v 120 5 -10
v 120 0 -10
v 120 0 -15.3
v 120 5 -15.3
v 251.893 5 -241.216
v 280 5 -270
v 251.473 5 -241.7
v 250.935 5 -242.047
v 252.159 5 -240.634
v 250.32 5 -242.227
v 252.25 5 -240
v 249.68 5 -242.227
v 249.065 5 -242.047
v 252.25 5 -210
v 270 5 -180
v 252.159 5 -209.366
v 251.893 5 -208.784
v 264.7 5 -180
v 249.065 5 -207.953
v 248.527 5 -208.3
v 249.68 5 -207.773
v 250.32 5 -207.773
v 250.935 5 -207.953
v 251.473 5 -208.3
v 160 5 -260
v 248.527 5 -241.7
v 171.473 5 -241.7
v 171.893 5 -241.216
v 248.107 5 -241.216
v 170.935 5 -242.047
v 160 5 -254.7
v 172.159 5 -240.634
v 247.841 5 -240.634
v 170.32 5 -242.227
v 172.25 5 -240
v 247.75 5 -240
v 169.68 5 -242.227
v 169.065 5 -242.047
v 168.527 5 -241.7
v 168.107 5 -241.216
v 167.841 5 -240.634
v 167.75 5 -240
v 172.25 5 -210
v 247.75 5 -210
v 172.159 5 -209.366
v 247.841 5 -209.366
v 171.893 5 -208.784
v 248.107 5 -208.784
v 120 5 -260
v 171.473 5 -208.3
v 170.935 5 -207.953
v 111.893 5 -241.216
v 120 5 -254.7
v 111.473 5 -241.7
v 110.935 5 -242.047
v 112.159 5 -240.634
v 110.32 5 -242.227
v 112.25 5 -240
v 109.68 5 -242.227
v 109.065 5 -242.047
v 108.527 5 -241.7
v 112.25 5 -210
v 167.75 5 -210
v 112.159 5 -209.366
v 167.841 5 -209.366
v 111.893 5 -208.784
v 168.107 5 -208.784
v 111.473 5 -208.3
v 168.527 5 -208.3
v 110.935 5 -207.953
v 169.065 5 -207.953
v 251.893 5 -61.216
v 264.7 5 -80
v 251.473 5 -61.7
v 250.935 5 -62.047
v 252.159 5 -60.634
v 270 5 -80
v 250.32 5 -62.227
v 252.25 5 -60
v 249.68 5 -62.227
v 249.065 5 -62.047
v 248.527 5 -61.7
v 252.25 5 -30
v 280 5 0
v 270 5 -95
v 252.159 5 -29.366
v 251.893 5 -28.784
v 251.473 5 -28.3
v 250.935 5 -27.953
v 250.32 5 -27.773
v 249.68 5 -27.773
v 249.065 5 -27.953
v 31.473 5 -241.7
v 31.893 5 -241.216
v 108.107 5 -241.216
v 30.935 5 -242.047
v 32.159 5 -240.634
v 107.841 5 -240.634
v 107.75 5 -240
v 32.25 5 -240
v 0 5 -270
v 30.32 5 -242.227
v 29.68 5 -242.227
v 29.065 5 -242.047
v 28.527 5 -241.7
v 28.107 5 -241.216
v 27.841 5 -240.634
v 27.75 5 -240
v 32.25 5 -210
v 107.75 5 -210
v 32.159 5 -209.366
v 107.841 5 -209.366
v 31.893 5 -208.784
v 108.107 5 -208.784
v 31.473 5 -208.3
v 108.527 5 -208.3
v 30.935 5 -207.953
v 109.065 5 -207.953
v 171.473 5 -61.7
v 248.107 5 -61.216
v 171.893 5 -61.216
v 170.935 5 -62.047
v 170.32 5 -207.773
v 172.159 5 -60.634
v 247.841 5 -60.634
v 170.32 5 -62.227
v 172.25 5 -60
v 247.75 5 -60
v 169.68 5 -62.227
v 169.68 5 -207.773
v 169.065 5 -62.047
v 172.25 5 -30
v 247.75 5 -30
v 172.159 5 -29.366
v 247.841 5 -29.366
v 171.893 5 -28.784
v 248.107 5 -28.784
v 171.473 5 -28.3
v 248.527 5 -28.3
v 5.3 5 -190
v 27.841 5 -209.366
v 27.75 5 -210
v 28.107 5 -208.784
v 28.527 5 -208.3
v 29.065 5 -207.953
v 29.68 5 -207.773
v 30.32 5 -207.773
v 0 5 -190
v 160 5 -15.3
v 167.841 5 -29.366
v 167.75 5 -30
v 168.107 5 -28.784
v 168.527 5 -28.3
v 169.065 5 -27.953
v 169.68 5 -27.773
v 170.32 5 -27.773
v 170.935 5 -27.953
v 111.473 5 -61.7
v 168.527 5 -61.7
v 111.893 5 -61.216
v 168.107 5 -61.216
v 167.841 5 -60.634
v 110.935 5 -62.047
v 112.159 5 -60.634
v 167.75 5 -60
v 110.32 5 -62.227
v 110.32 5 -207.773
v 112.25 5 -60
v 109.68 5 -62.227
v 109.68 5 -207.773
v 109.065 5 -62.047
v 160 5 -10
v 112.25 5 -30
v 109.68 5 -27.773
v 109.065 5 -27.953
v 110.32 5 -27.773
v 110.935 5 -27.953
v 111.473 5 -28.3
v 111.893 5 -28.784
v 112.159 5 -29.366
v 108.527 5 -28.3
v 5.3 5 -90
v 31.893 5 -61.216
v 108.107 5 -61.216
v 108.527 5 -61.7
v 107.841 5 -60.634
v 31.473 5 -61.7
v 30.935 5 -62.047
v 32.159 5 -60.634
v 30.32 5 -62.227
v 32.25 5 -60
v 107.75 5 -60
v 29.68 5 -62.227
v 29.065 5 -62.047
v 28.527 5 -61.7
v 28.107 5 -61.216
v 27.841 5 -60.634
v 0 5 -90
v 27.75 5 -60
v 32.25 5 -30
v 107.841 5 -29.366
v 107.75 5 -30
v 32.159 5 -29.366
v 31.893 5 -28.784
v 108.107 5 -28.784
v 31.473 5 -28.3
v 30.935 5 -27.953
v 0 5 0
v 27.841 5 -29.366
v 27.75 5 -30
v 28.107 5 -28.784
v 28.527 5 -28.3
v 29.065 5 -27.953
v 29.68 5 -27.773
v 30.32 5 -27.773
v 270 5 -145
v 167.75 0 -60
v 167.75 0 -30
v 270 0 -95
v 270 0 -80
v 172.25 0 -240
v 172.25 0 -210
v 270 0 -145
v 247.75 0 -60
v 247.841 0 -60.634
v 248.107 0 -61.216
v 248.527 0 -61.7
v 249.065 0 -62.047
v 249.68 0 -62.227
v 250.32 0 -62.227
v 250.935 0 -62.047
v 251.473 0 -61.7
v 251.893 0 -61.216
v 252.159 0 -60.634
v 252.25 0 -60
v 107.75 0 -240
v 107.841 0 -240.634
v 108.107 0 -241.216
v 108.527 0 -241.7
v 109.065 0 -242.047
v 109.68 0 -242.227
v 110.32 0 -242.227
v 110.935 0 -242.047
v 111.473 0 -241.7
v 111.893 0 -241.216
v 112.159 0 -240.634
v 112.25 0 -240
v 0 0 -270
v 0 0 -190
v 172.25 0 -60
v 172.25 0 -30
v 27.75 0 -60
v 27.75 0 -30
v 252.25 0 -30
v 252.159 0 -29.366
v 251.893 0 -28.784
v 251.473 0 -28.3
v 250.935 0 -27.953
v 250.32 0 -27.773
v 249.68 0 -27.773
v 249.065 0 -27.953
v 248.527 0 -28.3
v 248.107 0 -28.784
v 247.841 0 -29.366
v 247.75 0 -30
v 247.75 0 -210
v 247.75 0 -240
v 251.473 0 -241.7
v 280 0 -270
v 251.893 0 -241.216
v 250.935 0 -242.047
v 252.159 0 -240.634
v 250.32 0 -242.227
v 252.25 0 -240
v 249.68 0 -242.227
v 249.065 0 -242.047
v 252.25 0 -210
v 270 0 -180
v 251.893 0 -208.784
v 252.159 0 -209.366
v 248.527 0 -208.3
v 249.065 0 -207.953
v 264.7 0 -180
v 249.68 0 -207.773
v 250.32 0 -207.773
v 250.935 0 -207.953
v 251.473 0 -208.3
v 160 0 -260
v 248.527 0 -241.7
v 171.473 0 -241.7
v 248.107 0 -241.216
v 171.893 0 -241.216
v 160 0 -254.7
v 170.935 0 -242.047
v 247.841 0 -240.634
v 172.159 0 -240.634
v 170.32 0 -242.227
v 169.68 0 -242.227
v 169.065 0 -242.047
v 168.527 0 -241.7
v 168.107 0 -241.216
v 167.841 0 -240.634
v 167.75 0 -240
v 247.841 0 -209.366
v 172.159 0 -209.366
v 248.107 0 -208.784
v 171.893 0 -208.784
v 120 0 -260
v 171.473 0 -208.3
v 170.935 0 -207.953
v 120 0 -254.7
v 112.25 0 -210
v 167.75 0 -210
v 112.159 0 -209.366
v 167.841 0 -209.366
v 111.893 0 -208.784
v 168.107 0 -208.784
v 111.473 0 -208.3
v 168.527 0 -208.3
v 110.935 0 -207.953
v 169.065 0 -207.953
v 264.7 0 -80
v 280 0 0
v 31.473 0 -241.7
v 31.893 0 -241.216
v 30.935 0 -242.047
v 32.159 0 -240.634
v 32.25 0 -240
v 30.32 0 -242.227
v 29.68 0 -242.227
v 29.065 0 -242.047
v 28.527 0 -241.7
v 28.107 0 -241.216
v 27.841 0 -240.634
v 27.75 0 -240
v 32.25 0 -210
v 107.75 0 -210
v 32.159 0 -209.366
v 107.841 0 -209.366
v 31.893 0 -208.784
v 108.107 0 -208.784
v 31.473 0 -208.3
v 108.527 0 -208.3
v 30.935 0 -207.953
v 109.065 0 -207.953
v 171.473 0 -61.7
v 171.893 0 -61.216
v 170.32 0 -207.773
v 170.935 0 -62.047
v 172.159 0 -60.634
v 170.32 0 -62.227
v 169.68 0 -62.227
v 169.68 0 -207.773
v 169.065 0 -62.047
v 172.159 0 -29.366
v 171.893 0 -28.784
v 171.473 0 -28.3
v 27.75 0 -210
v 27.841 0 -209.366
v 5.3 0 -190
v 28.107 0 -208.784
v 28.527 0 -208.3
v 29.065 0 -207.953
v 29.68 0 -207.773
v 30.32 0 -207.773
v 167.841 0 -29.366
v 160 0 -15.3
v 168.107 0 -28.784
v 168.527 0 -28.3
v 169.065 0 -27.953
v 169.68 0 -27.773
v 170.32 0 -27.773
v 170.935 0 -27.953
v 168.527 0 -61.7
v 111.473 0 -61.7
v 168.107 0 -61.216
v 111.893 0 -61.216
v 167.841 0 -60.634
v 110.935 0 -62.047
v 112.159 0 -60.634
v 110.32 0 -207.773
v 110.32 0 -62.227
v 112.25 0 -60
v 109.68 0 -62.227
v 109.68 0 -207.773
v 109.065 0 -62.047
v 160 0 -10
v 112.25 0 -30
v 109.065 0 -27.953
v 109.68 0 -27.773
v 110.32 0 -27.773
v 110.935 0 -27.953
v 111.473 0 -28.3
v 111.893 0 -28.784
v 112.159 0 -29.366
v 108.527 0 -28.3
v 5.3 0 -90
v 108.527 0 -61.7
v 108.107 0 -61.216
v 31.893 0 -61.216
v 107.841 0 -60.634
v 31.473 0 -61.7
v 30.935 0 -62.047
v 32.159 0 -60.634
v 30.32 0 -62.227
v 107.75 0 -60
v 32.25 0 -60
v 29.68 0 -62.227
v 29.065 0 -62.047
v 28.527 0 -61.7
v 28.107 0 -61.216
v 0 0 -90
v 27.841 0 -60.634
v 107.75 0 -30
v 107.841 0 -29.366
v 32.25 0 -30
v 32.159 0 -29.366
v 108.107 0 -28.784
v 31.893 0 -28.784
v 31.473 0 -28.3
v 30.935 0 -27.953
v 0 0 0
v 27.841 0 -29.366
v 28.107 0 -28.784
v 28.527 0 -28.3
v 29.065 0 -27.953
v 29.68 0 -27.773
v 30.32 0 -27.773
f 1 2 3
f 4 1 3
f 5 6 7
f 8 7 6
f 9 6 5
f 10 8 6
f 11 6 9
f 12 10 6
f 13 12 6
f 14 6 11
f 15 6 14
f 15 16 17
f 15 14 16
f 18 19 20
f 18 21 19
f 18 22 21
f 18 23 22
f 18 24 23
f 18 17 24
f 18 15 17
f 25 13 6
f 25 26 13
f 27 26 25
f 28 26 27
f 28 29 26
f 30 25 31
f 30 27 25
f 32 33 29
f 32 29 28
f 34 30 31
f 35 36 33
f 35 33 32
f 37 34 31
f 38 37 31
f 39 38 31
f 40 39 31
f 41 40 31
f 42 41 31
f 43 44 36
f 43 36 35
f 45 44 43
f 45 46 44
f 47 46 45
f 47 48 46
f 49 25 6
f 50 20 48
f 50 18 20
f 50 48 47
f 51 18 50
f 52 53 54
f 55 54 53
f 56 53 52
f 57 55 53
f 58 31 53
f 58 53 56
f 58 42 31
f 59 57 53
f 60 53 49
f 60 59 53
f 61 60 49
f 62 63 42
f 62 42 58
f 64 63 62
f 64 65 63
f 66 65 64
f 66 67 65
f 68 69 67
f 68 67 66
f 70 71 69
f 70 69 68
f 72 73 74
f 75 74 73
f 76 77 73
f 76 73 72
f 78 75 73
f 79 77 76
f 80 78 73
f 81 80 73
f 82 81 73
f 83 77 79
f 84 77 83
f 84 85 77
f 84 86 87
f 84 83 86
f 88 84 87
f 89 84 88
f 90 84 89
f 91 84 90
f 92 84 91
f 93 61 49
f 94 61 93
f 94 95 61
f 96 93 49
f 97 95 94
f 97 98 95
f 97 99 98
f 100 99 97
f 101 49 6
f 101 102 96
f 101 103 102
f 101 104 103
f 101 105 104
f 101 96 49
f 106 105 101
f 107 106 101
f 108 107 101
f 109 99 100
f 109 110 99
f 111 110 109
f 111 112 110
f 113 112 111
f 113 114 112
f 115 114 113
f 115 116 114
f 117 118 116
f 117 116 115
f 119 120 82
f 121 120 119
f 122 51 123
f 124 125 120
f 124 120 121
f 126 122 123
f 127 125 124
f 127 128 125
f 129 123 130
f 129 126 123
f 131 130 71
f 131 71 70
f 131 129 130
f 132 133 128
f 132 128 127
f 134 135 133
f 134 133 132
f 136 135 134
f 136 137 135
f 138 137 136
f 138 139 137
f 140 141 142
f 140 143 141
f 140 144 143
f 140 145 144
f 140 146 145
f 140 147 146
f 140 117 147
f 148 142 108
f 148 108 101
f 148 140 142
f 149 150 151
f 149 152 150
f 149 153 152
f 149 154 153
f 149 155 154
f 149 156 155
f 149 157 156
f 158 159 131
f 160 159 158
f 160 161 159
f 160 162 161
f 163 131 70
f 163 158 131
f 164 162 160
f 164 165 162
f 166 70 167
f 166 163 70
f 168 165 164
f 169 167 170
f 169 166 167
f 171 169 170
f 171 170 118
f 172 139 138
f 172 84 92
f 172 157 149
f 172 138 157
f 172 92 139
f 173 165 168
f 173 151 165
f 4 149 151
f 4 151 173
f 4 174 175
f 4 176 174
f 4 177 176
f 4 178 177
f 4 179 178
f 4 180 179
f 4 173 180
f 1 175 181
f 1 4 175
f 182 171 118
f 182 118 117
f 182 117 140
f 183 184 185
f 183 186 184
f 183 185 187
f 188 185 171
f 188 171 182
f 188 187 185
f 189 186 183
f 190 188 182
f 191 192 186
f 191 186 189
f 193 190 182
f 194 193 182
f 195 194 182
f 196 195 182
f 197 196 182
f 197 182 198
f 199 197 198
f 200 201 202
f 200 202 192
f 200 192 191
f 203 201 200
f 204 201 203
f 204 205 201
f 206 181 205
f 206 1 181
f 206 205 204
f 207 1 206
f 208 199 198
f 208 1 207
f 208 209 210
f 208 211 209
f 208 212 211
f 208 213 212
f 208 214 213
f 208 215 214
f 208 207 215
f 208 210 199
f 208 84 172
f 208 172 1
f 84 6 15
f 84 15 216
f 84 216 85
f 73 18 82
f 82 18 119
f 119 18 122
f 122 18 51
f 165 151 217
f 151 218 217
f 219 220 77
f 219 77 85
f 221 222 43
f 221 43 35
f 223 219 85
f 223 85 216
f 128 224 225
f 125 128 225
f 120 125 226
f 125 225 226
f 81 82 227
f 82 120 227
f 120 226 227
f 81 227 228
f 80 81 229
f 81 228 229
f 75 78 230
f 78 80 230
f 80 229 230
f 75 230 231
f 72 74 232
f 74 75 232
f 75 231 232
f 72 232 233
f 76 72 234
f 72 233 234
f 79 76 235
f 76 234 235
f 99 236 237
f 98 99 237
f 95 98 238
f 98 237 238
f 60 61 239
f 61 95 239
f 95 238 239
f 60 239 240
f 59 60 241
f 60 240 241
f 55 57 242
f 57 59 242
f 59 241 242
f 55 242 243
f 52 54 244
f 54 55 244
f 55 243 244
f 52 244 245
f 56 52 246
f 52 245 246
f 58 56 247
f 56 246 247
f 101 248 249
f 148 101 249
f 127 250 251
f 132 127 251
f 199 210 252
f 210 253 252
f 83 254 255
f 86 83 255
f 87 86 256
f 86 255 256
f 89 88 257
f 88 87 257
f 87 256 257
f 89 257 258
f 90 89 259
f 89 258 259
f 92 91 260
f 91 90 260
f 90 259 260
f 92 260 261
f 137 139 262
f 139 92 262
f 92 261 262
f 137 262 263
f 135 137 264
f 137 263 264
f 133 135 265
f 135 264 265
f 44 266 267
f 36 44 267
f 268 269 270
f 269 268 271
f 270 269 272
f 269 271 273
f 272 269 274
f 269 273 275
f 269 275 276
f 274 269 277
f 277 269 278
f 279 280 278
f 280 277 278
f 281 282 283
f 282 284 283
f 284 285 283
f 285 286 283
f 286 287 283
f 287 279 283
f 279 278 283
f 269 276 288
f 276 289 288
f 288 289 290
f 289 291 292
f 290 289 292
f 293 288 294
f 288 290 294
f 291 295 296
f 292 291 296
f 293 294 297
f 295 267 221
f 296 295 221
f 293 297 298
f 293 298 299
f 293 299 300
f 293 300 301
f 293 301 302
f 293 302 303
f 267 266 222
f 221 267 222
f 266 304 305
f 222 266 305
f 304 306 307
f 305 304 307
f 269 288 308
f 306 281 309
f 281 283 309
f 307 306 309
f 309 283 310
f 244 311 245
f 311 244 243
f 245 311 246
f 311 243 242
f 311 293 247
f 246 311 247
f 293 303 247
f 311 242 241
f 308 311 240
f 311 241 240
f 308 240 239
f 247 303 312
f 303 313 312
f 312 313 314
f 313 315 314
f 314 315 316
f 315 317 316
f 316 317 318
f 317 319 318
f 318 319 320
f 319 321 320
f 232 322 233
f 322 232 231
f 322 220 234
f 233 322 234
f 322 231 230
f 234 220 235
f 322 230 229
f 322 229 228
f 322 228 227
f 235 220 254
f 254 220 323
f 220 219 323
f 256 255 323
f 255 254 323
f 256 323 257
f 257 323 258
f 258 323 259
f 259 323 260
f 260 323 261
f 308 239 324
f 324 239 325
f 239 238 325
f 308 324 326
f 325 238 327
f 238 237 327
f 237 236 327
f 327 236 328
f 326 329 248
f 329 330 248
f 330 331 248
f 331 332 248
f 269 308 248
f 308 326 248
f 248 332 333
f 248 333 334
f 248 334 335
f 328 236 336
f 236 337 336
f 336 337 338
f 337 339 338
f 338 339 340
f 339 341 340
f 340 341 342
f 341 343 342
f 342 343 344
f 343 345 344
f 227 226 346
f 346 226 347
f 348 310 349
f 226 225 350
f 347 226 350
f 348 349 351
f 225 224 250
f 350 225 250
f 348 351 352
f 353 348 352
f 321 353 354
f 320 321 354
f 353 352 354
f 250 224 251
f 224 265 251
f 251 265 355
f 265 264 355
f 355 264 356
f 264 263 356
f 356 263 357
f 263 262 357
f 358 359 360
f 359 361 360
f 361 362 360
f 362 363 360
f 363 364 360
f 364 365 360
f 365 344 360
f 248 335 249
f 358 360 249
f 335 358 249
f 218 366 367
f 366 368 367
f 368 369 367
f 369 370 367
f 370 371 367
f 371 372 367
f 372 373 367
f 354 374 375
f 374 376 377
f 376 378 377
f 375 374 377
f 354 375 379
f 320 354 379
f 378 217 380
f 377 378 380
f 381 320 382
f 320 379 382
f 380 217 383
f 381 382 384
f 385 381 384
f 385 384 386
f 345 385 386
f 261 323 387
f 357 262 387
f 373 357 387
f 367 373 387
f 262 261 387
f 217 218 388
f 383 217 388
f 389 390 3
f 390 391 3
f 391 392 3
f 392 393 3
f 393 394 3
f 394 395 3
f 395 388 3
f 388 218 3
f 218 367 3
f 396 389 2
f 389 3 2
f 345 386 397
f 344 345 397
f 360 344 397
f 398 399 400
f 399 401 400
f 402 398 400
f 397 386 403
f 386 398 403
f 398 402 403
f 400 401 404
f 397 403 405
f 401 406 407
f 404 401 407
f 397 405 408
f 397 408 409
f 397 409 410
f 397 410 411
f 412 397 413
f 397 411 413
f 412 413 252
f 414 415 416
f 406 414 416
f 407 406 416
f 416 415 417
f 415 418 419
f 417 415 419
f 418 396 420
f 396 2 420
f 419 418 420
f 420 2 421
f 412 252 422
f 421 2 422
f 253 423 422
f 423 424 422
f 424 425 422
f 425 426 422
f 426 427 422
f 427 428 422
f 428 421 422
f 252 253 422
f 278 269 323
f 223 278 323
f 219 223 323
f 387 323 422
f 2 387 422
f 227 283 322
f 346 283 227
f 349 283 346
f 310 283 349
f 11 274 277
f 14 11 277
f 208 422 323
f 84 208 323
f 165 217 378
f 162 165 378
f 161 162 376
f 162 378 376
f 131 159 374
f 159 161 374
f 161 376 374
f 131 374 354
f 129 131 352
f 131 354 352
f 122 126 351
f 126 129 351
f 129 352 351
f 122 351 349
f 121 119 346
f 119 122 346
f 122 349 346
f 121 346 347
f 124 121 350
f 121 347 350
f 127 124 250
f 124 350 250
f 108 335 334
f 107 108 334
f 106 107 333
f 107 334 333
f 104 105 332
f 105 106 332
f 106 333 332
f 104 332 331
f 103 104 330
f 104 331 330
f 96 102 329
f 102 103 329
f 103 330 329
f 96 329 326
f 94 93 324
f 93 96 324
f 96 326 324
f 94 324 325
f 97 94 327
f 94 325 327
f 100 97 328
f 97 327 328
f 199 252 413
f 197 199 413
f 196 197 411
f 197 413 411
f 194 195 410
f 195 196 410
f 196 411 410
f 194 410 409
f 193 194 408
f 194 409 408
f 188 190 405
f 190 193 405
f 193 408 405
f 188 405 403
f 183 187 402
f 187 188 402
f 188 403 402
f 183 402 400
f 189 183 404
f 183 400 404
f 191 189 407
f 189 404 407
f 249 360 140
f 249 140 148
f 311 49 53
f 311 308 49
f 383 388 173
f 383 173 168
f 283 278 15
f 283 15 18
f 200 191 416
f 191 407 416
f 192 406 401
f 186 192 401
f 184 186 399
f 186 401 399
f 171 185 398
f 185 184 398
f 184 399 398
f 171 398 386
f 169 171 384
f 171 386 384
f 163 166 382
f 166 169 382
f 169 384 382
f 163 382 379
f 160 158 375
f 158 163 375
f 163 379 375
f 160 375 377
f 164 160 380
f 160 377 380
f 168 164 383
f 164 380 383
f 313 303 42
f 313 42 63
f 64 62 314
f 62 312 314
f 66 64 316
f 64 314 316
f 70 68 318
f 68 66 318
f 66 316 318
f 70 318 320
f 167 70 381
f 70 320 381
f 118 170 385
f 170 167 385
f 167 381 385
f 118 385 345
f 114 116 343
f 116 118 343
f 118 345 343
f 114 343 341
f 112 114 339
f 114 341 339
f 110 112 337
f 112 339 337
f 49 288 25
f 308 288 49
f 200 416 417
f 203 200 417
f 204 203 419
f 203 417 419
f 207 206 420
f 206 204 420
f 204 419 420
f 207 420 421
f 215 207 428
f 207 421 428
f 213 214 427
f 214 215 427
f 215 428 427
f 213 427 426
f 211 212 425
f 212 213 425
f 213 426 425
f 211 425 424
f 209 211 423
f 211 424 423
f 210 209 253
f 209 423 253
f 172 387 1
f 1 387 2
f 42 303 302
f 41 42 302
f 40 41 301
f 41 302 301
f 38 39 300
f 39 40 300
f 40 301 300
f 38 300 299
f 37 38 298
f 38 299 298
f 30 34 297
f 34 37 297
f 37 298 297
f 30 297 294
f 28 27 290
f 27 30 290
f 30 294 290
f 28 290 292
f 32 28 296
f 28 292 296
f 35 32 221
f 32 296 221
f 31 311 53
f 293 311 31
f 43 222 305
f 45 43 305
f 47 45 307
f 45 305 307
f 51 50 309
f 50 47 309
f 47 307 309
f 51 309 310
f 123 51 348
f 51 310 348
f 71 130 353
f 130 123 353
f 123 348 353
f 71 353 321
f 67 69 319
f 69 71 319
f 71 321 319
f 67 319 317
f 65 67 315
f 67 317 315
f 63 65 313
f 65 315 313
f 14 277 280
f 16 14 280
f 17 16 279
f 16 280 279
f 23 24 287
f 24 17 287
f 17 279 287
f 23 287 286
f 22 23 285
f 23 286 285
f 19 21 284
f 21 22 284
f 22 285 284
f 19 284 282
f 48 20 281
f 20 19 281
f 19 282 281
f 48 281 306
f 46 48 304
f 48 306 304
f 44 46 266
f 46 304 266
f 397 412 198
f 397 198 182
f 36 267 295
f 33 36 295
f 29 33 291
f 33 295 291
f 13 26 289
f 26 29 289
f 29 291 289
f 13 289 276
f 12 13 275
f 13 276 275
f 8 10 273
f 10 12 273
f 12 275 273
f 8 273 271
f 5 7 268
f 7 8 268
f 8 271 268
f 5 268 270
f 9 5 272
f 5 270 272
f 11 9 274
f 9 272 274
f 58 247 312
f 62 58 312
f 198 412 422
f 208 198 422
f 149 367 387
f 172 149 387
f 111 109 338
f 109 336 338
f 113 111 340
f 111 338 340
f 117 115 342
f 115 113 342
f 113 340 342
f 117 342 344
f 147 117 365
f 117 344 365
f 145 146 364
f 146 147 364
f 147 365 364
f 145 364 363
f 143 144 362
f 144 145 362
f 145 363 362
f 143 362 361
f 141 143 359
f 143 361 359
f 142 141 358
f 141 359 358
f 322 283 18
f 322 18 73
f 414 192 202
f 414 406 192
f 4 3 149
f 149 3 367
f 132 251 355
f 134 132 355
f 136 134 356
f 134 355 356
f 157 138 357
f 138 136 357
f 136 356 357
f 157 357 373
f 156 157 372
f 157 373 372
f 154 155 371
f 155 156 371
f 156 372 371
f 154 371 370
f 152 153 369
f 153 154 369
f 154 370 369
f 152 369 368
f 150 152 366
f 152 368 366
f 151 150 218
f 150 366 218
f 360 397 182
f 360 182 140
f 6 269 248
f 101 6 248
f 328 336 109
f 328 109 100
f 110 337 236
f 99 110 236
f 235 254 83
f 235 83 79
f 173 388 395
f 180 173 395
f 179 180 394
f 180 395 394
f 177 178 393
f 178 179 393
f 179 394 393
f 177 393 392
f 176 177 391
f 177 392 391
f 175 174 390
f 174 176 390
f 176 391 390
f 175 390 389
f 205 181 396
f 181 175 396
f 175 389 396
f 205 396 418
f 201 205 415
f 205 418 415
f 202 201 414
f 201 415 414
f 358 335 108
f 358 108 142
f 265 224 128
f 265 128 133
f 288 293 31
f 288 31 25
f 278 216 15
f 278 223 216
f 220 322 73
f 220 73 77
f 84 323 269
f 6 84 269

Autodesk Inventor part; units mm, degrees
ref_plane "YZ Plane" through (0, 0, 0) normal (1, 0, 0) x (0, 1, 0)
ref_plane "XZ Plane" through (0, 0, 0) normal (0, 1, 0) x (-1, 0, 0)
ref_plane "XY Plane" through (0, 0, 0) normal (0, 0, 1) x (1, 0, 0)
sketch "Sketch1" plane through (0, 0, 0) normal (0, 1, 0) x (-1, 0, 0)
  line L0 (0, 0) -> (-280, 0)
  line L1 (-280, 0) -> (-280, -270)
  line L2 (-280, -270) -> (0, -270)
  line L3 (0, -270) -> (0, 0)
  line L4 (0, -135) -> (-280, -135) construction
  line L5 (-140, 0) -> (-140, -270) construction
  line L6 (-70, 0) -> (-70, -270) construction
  line L7 (-210, 0) -> (-210, -270) construction
  line L8 (-30, -240) -> (-30, -210) construction
  line L9 (-30, -240) -> (-30, -210) construction
  line L10 (-27.75, -240) -> (-27.75, -210)
  line L11 (-32.25, -210) -> (-32.25, -240)
  arc A0 (-32.25, -240) -> (-27.75, -240) centre (-30, -240) ccw
  arc A1 (-27.75, -210) -> (-32.25, -210) centre (-30, -210) ccw
  line L12 (-110, -240) -> (-110, -210) construction
  line L13 (-110, -240) -> (-110, -210) construction
  line L14 (-112.25, -240) -> (-112.25, -210)
  line L15 (-107.75, -210) -> (-107.75, -240)
  arc A2 (-112.25, -240) -> (-107.75, -240) centre (-110, -240) ccw
  arc A3 (-107.75, -210) -> (-112.25, -210) centre (-110, -210) ccw
  line L16 (-160, -260) -> (-120, -260)
  line L17 (-120, -260) -> (-120, -254.7)
  line L18 (-120, -254.7) -> (-160, -254.7)
  line L19 (-160, -254.7) -> (-160, -260)
  line L20 (-250, -240) -> (-250, -210) construction
  line L21 (-250, -240) -> (-250, -210) construction
  line L22 (-252.25, -240) -> (-252.25, -210)
  line L23 (-247.75, -210) -> (-247.75, -240)
  arc A4 (-252.25, -240) -> (-247.75, -240) centre (-250, -240) ccw
  arc A5 (-247.75, -210) -> (-252.25, -210) centre (-250, -210) ccw
  line L24 (-172.25, -210) -> (-172.25, -240)
  line L25 (-170, -240) -> (-170, -210) construction
  line L26 (-167.75, -240) -> (-167.75, -210)
  arc A6 (-172.25, -240) -> (-167.75, -240) centre (-170, -240) ccw
  line L27 (-170, -240) -> (-170, -210) construction
  arc A7 (-167.75, -210) -> (-172.25, -210) centre (-170, -210) ccw
  line L28 (-140, -270) -> (-140, 0) construction
  line L29 (-30, -30) -> (-30, -60) construction
  line L30 (-30, -30) -> (-30, -60) construction
  line L31 (-27.75, -30) -> (-27.75, -60)
  line L32 (-32.25, -60) -> (-32.25, -30)
  arc A8 (-27.75, -30) -> (-32.25, -30) centre (-30, -30) ccw
  arc A9 (-32.25, -60) -> (-27.75, -60) centre (-30, -60) ccw
  line L33 (-107.75, -60) -> (-107.75, -30)
  line L34 (-110, -30) -> (-110, -60) construction
  line L35 (-112.25, -30) -> (-112.25, -60)
  arc A10 (-107.75, -30) -> (-112.25, -30) centre (-110, -30) ccw
  line L36 (-110, -30) -> (-110, -60) construction
  arc A11 (-112.25, -60) -> (-107.75, -60) centre (-110, -60) ccw
  line L37 (-160, -10) -> (-120, -10)
  line L38 (-120, -10) -> (-120, -15.3)
  line L39 (-120, -15.3) -> (-160, -15.3)
  line L40 (-160, -15.3) -> (-160, -10)
  arc A12 (-247.75, -30) -> (-252.25, -30) centre (-250, -30) ccw
  line L41 (-247.75, -60) -> (-247.75, -30)
  line L42 (-250, -30) -> (-250, -60) construction
  line L43 (-250, -30) -> (-250, -60) construction
  arc A13 (-252.25, -60) -> (-247.75, -60) centre (-250, -60) ccw
  line L44 (-252.25, -30) -> (-252.25, -60)
  line L45 (-172.25, -60) -> (-172.25, -30)
  line L46 (-170, -30) -> (-170, -60) construction
  line L47 (-170, -30) -> (-170, -60) construction
  arc A14 (-172.25, -60) -> (-167.75, -60) centre (-170, -60) ccw
  line L48 (-167.75, -30) -> (-167.75, -60)
  arc A15 (-167.75, -30) -> (-172.25, -30) centre (-170, -30) ccw
  line L49 (-270, -95) -> (-270, -145)
  line L50 (-270, -145) -> (-270, -180)
  line L51 (-270, -180) -> (-264.7, -180)
  line L52 (-264.7, -180) -> (-264.7, -80)
  line L53 (-264.7, -80) -> (-270, -80)
  line L54 (-270, -80) -> (-270, -95)
  line L55 (0, -90) -> (-5.3, -90)
  line L56 (-5.3, -90) -> (-5.3, -190)
  line L57 (-5.3, -190) -> (0, -190)
  line L58 (0, -190) -> (0, -90)
  point P0 (-30, -225)
  point P1 (-110, -225)
  point P2 (-250, -225)
  point P3 (-170, -225)
  point P4 (-30, -45)
  point P5 (-110, -45)
  point P6 (-250, -45)
  point P7 (-170, -45)
  point P8 (0, -190)
  dimension "d0" = 280
  dimension "d1" = 270
  dimension "d2" = 30
  dimension "d3" = 40
  dimension "d4" = 30
  dimension "d6" = 2.25
  dimension "d9" = 40
  dimension "d13" = 10
  dimension "d14" = 5.3
  dimension "d16" = 20
  dimension "d20" = 10
  dimension "d21" = 5.3
  dimension "d22" = 5.3
extrude "Extrusion1" add sketch "Sketch1" along normal blind 5 contours L3 L55 L56 L57 L2 L1 L0
properties part number "base_2"
